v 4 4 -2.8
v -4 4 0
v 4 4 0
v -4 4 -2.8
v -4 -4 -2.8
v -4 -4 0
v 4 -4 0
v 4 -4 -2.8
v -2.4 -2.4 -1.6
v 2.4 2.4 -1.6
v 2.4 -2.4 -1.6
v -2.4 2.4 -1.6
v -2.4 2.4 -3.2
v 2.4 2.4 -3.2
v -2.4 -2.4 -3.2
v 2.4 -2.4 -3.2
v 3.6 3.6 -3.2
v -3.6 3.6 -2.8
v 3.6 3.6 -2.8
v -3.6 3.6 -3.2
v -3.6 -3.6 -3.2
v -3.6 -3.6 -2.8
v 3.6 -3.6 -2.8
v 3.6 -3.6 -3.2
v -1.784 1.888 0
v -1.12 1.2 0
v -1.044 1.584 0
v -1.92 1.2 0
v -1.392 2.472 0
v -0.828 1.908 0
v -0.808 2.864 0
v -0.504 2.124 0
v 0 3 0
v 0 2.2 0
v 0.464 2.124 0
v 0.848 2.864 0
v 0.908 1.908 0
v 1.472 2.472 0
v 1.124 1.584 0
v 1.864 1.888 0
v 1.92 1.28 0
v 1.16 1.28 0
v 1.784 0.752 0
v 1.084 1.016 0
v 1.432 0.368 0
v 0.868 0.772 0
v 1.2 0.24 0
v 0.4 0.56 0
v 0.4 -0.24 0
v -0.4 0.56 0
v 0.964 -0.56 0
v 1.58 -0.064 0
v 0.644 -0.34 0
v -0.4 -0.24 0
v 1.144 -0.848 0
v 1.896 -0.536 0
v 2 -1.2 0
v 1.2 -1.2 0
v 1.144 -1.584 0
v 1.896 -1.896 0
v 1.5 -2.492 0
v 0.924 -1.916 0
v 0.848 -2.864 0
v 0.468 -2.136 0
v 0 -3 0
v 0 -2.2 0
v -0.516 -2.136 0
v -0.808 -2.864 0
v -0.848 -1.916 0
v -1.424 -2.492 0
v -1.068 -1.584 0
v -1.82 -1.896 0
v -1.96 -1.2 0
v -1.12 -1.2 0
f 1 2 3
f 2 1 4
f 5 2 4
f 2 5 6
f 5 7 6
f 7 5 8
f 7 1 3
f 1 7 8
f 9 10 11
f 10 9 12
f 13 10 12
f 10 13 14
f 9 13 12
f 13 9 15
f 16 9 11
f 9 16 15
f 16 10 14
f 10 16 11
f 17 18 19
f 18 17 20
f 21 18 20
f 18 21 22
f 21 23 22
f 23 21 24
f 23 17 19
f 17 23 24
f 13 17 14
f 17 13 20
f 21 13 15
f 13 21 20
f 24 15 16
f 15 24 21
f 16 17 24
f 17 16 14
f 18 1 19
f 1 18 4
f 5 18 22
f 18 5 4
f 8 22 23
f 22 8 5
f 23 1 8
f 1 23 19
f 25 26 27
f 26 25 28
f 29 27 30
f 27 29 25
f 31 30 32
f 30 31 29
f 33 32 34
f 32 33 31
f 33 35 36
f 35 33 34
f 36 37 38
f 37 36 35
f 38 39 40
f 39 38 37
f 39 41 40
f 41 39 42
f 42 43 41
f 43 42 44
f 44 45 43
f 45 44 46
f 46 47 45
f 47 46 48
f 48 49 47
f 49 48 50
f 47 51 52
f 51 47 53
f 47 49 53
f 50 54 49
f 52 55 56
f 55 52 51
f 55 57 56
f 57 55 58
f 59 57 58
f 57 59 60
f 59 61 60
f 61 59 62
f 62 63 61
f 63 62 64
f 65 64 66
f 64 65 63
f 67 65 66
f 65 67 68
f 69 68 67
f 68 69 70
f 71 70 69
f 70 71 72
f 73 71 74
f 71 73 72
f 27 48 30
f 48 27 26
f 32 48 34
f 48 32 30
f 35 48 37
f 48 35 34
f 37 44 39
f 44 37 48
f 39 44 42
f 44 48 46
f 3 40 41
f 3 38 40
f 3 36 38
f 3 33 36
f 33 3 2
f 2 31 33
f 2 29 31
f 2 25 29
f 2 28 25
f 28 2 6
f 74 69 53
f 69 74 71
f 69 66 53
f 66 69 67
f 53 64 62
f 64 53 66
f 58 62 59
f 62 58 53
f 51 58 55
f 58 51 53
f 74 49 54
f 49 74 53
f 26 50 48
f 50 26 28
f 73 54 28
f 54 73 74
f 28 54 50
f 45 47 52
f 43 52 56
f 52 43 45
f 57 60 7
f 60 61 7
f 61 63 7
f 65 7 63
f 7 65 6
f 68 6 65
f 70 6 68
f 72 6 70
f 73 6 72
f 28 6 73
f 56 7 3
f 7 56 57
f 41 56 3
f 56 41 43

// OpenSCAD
// file: ../p/4-4edge.scad
use <../lib.scad>
$fa=1; $fs=0.2;
function ldraw_lib__4_4edge(realsolid=false) = [
// 0 Circle 1.0
// 0 Name: 4-4edge.dat
// 0 Author: James Jessiman
// 0 !LDRAW_ORG Primitive UPDATE 2017-01
// 0 !LICENSE Licensed under CC BY 2.0 and CC BY 4.0 : see CAreadme.txt
// 
// 0 BFC CERTIFY CCW
  [0,"BFC","CERTIFY"],
  [0,"BFC","CCW"],
// 
// 0 !HISTORY 1998-12-15 [PTadmin] Official Update 1998-10
// 0 !HISTORY 2005-12-28 [PTadmin] Official Update 2005-01
// 0 !HISTORY 2007-06-24 [PTadmin] Header formatted for Contributor Agreement
// 0 !HISTORY 2008-07-01 [PTadmin] Official Update 2008-01
// 0 !HISTORY 2017-01-15 [Steffen] BFCed
// 0 !HISTORY 2017-12-30 [PTadmin] Official Update 2017-01
// 
// 
// 2 24 1 0 0 0.9239 0 0.3827
  [2,24,1,0,0,0.9239,0,0.3827],
// 2 24 0.9239 0 0.3827 0.7071 0 0.7071
  [2,24,0.9239,0,0.3827,0.7071,0,0.7071],
// 2 24 0.7071 0 0.7071 0.3827 0 0.9239
  [2,24,0.7071,0,0.7071,0.3827,0,0.9239],
// 2 24 0.3827 0 0.9239 0 0 1
  [2,24,0.3827,0,0.9239,0,0,1],
// 2 24 0 0 1 -0.3827 0 0.9239
  [2,24,0,0,1,-0.3827,0,0.9239],
// 2 24 -0.3827 0 0.9239 -0.7071 0 0.7071
  [2,24,-0.3827,0,0.9239,-0.7071,0,0.7071],
// 2 24 -0.7071 0 0.7071 -0.9239 0 0.3827
  [2,24,-0.7071,0,0.7071,-0.9239,0,0.3827],
// 2 24 -0.9239 0 0.3827 -1 0 -0
  [2,24,-0.9239,0,0.3827,-1,0,-0],
// 2 24 -1 0 -0 -0.9239 0 -0.3827
  [2,24,-1,0,-0,-0.9239,0,-0.3827],
// 2 24 -0.9239 0 -0.3827 -0.7071 0 -0.7071
  [2,24,-0.9239,0,-0.3827,-0.7071,0,-0.7071],
// 2 24 -0.7071 0 -0.7071 -0.3827 0 -0.9239
  [2,24,-0.7071,0,-0.7071,-0.3827,0,-0.9239],
// 2 24 -0.3827 0 -0.9239 0 0 -1
  [2,24,-0.3827,0,-0.9239,0,0,-1],
// 2 24 0 0 -1 0.3827 0 -0.9239
  [2,24,0,0,-1,0.3827,0,-0.9239],
// 2 24 0.3827 0 -0.9239 0.7071 0 -0.7071
  [2,24,0.3827,0,-0.9239,0.7071,0,-0.7071],
// 2 24 0.7071 0 -0.7071 0.9239 0 -0.3827
  [2,24,0.7071,0,-0.7071,0.9239,0,-0.3827],
// 2 24 0.9239 0 -0.3827 1 0 0
  [2,24,0.9239,0,-0.3827,1,0,0],
];
module ldraw_lib__4_4edge(step=0, col=false, unit=2/5, alt=false, line=0.2, solid=!$preview)
    makepoly(ldraw_lib__4_4edge(solid), step=step, col=col, unit=unit, alt=alt, line=line, solid=solid);
ldraw_lib__4_4edge(line=0.2);
// file: ../p/4-4disc.scad
use <../lib.scad>
$fa=1; $fs=0.2;
function ldraw_lib__4_4disc(realsolid=false) = [
// 0 Disc 1.0
// 0 Name: 4-4disc.dat
// 0 Author: James Jessiman
// 0 !LDRAW_ORG Primitive UPDATE 2002-02
// 0 !LICENSE Licensed under CC BY 2.0 and CC BY 4.0 : see CAreadme.txt
// 
// 0 BFC CERTIFY CCW
  [0,"BFC","CERTIFY"],
  [0,"BFC","CCW"],
// 
// 0 !HISTORY 1998-12-15 [PTadmin] Official Update 1998-10
// 0 !HISTORY 2002-03-23 [sbliss] Added BFC statement
// 0 !HISTORY 2002-04-25 [PTadmin] Official Update 2002-02
// 0 !HISTORY 2007-06-24 [PTadmin] Header formatted for Contributor Agreement
// 0 !HISTORY 2008-07-01 [PTadmin] Official Update 2008-01
// 
// 
// 3 16 0 0 0 1 0 0 0.9239 0 0.3827
  [3,16,0,0,0,1,0,0,0.9239,0,0.3827],
// 3 16 0 0 0 0.9239 0 0.3827 0.7071 0 0.7071
  [3,16,0,0,0,0.9239,0,0.3827,0.7071,0,0.7071],
// 3 16 0 0 0 0.7071 0 0.7071 0.3827 0 0.9239
  [3,16,0,0,0,0.7071,0,0.7071,0.3827,0,0.9239],
// 3 16 0 0 0 0.3827 0 0.9239 0 0 1
  [3,16,0,0,0,0.3827,0,0.9239,0,0,1],
// 3 16 0 0 0 0 0 1 -0.3827 0 0.9239
  [3,16,0,0,0,0,0,1,-0.3827,0,0.9239],
// 3 16 0 0 0 -0.3827 0 0.9239 -0.7071 0 0.7071
  [3,16,0,0,0,-0.3827,0,0.9239,-0.7071,0,0.7071],
// 3 16 0 0 0 -0.7071 0 0.7071 -0.9239 0 0.3827
  [3,16,0,0,0,-0.7071,0,0.7071,-0.9239,0,0.3827],
// 3 16 0 0 0 -0.9239 0 0.3827 -1 0 -0
  [3,16,0,0,0,-0.9239,0,0.3827,-1,0,-0],
// 3 16 0 0 0 -1 0 -0 -0.9239 0 -0.3827
  [3,16,0,0,0,-1,0,-0,-0.9239,0,-0.3827],
// 3 16 0 0 0 -0.9239 0 -0.3827 -0.7071 0 -0.7071
  [3,16,0,0,0,-0.9239,0,-0.3827,-0.7071,0,-0.7071],
// 3 16 0 0 0 -0.7071 0 -0.7071 -0.3827 0 -0.9239
  [3,16,0,0,0,-0.7071,0,-0.7071,-0.3827,0,-0.9239],
// 3 16 0 0 0 -0.3827 0 -0.9239 0 0 -1
  [3,16,0,0,0,-0.3827,0,-0.9239,0,0,-1],
// 3 16 0 0 0 0 0 -1 0.3827 0 -0.9239
  [3,16,0,0,0,0,0,-1,0.3827,0,-0.9239],
// 3 16 0 0 0 0.3827 0 -0.9239 0.7071 0 -0.7071
  [3,16,0,0,0,0.3827,0,-0.9239,0.7071,0,-0.7071],
// 3 16 0 0 0 0.7071 0 -0.7071 0.9239 0 -0.3827
  [3,16,0,0,0,0.7071,0,-0.7071,0.9239,0,-0.3827],
// 3 16 0 0 0 0.9239 0 -0.3827 1 0 0
  [3,16,0,0,0,0.9239,0,-0.3827,1,0,0],
// 0
];
module ldraw_lib__4_4disc(step=0, col=false, unit=2/5, alt=false, line=0.2, solid=!$preview)
    makepoly(ldraw_lib__4_4disc(solid), step=step, col=col, unit=unit, alt=alt, line=line, solid=solid);
ldraw_lib__4_4disc(line=0.2);
// file: ../p/4-4cyli.scad
use <../lib.scad>
$fa=1; $fs=0.2;
function ldraw_lib__4_4cyli(realsolid=false) = [
// 0 Cylinder 1.0
// 0 Name: 4-4cyli.dat
// 0 Author: James Jessiman
// 0 !LDRAW_ORG Primitive UPDATE 2005-01
// 0 !LICENSE Licensed under CC BY 2.0 and CC BY 4.0 : see CAreadme.txt
// 
// 0 BFC CERTIFY CCW
  [0,"BFC","CERTIFY"],
  [0,"BFC","CCW"],
// 
// 0 !HISTORY 1998-12-15 [PTadmin] Official Update 1998-10
// 0 !HISTORY 2002-03-23 [sbliss] Added BFC statement; merged headers from files in distributions LDraw 0.27 and Complete.
// 0 !HISTORY 2002-04-25 [PTadmin] Official Update 2002-02
// 0 !HISTORY 2004-12-14 [guyvivan] BFC CCW
// 0 !HISTORY 2005-12-28 [PTadmin] Official Update 2005-01
// 0 !HISTORY 2007-06-24 [PTadmin] Header formatted for Contributor Agreement
// 0 !HISTORY 2008-07-01 [PTadmin] Official Update 2008-01
// 
// 
// 4 16 1 1 0 0.9239 1 0.3827 0.9239 0 0.3827 1 0 0
  [4,16,1,1,0,0.9239,1,0.3827,0.9239,0,0.3827,1,0,0],
// 5 24 1 0 0 1 1 0 0.9239 0 0.3827 0.9239 0 -0.3827
  [5,24,1,0,0,1,1,0,0.9239,0,0.3827,0.9239,0,-0.3827],
// 4 16 0.9239 1 0.3827 0.7071 1 0.7071 0.7071 0 0.7071 0.9239 0 0.3827
  [4,16,0.9239,1,0.3827,0.7071,1,0.7071,0.7071,0,0.7071,0.9239,0,0.3827],
// 5 24 0.9239 0 0.3827 0.9239 1 0.3827 0.7071 0 0.7071 1 0 0
  [5,24,0.9239,0,0.3827,0.9239,1,0.3827,0.7071,0,0.7071,1,0,0],
// 4 16 0.7071 1 0.7071 0.3827 1 0.9239 0.3827 0 0.9239 0.7071 0 0.7071
  [4,16,0.7071,1,0.7071,0.3827,1,0.9239,0.3827,0,0.9239,0.7071,0,0.7071],
// 5 24 0.7071 0 0.7071 0.7071 1 0.7071 0.3827 0 0.9239 0.9239 0 0.3827
  [5,24,0.7071,0,0.7071,0.7071,1,0.7071,0.3827,0,0.9239,0.9239,0,0.3827],
// 4 16 0.3827 1 0.9239 0 1 1 0 0 1 0.3827 0 0.9239
  [4,16,0.3827,1,0.9239,0,1,1,0,0,1,0.3827,0,0.9239],
// 5 24 0.3827 0 0.9239 0.3827 1 0.9239 0 0 1 0.7071 0 0.7071
  [5,24,0.3827,0,0.9239,0.3827,1,0.9239,0,0,1,0.7071,0,0.7071],
// 4 16 0 1 1 -0.3827 1 0.9239 -0.3827 0 0.9239 0 0 1
  [4,16,0,1,1,-0.3827,1,0.9239,-0.3827,0,0.9239,0,0,1],
// 5 24 0 0 1 0 1 1 -0.3827 0 0.9239 0.3827 0 0.9239
  [5,24,0,0,1,0,1,1,-0.3827,0,0.9239,0.3827,0,0.9239],
// 4 16 -0.3827 1 0.9239 -0.7071 1 0.7071 -0.7071 0 0.7071 -0.3827 0 0.9239
  [4,16,-0.3827,1,0.9239,-0.7071,1,0.7071,-0.7071,0,0.7071,-0.3827,0,0.9239],
// 5 24 -0.3827 0 0.9239 -0.3827 1 0.9239 -0.7071 0 0.7071 0 0 1
  [5,24,-0.3827,0,0.9239,-0.3827,1,0.9239,-0.7071,0,0.7071,0,0,1],
// 4 16 -0.7071 1 0.7071 -0.9239 1 0.3827 -0.9239 0 0.3827 -0.7071 0 0.7071
  [4,16,-0.7071,1,0.7071,-0.9239,1,0.3827,-0.9239,0,0.3827,-0.7071,0,0.7071],
// 5 24 -0.7071 0 0.7071 -0.7071 1 0.7071 -0.9239 0 0.3827 -0.3827 0 0.9239
  [5,24,-0.7071,0,0.7071,-0.7071,1,0.7071,-0.9239,0,0.3827,-0.3827,0,0.9239],
// 4 16 -0.9239 1 0.3827 -1 1 0 -1 0 0 -0.9239 0 0.3827
  [4,16,-0.9239,1,0.3827,-1,1,0,-1,0,0,-0.9239,0,0.3827],
// 5 24 -0.9239 0 0.3827 -0.9239 1 0.3827 -1 0 0 -0.7071 0 0.7071
  [5,24,-0.9239,0,0.3827,-0.9239,1,0.3827,-1,0,0,-0.7071,0,0.7071],
// 4 16 -1 1 0 -0.9239 1 -0.3827 -0.9239 0 -0.3827 -1 0 0
  [4,16,-1,1,0,-0.9239,1,-0.3827,-0.9239,0,-0.3827,-1,0,0],
// 5 24 -1 0 0 -1 1 0 -0.9239 0 -0.3827 -0.9239 0 0.3827
  [5,24,-1,0,0,-1,1,0,-0.9239,0,-0.3827,-0.9239,0,0.3827],
// 4 16 -0.9239 1 -0.3827 -0.7071 1 -0.7071 -0.7071 0 -0.7071 -0.9239 0 -0.3827
  [4,16,-0.9239,1,-0.3827,-0.7071,1,-0.7071,-0.7071,0,-0.7071,-0.9239,0,-0.3827],
// 5 24 -0.9239 0 -0.3827 -0.9239 1 -0.3827 -0.7071 0 -0.7071 -1 0 0
  [5,24,-0.9239,0,-0.3827,-0.9239,1,-0.3827,-0.7071,0,-0.7071,-1,0,0],
// 4 16 -0.7071 1 -0.7071 -0.3827 1 -0.9239 -0.3827 0 -0.9239 -0.7071 0 -0.7071
  [4,16,-0.7071,1,-0.7071,-0.3827,1,-0.9239,-0.3827,0,-0.9239,-0.7071,0,-0.7071],
// 5 24 -0.7071 0 -0.7071 -0.7071 1 -0.7071 -0.3827 0 -0.9239 -0.9239 0 -0.3827
  [5,24,-0.7071,0,-0.7071,-0.7071,1,-0.7071,-0.3827,0,-0.9239,-0.9239,0,-0.3827],
// 4 16 -0.3827 1 -0.9239 0 1 -1 0 0 -1 -0.3827 0 -0.9239
  [4,16,-0.3827,1,-0.9239,0,1,-1,0,0,-1,-0.3827,0,-0.9239],
// 5 24 -0.3827 0 -0.9239 -0.3827 1 -0.9239 0 0 -1 -0.7071 0 -0.7071
  [5,24,-0.3827,0,-0.9239,-0.3827,1,-0.9239,0,0,-1,-0.7071,0,-0.7071],
// 4 16 0 1 -1 0.3827 1 -0.9239 0.3827 0 -0.9239 0 0 -1
  [4,16,0,1,-1,0.3827,1,-0.9239,0.3827,0,-0.9239,0,0,-1],
// 5 24 0 0 -1 0 1 -1 0.3827 0 -0.9239 -0.3827 0 -0.9239
  [5,24,0,0,-1,0,1,-1,0.3827,0,-0.9239,-0.3827,0,-0.9239],
// 4 16 0.3827 1 -0.9239 0.7071 1 -0.7071 0.7071 0 -0.7071 0.3827 0 -0.9239
  [4,16,0.3827,1,-0.9239,0.7071,1,-0.7071,0.7071,0,-0.7071,0.3827,0,-0.9239],
// 5 24 0.3827 0 -0.9239 0.3827 1 -0.9239 0.7071 0 -0.7071 0 0 -1
  [5,24,0.3827,0,-0.9239,0.3827,1,-0.9239,0.7071,0,-0.7071,0,0,-1],
// 4 16 0.7071 1 -0.7071 0.9239 1 -0.3827 0.9239 0 -0.3827 0.7071 0 -0.7071
  [4,16,0.7071,1,-0.7071,0.9239,1,-0.3827,0.9239,0,-0.3827,0.7071,0,-0.7071],
// 5 24 0.7071 0 -0.7071 0.7071 1 -0.7071 0.9239 0 -0.3827 0.3827 0 -0.9239
  [5,24,0.7071,0,-0.7071,0.7071,1,-0.7071,0.9239,0,-0.3827,0.3827,0,-0.9239],
// 4 16 0.9239 1 -0.3827 1 1 0 1 0 0 0.9239 0 -0.3827
  [4,16,0.9239,1,-0.3827,1,1,0,1,0,0,0.9239,0,-0.3827],
// 5 24 0.9239 0 -0.3827 0.9239 1 -0.3827 1 0 0 0.7071 0 -0.7071
  [5,24,0.9239,0,-0.3827,0.9239,1,-0.3827,1,0,0,0.7071,0,-0.7071],
// 0
];
module ldraw_lib__4_4cyli(step=0, col=false, unit=2/5, alt=false, line=0.2, solid=!$preview)
    makepoly(ldraw_lib__4_4cyli(solid), step=step, col=col, unit=unit, alt=alt, line=line, solid=solid);
ldraw_lib__4_4cyli(line=0.2);
// file: ../p/stud3.scad
use <../lib.scad>
use <4-4cyli.scad>
use <4-4disc.scad>
use <4-4edge.scad>
$fa=1; $fs=0.2;
function ldraw_lib__stud3(realsolid=false) = realsolid ? 
    [openscad(translate([0,0,-eps()], o=cylinder(4+eps(), r=4)),2)] : [
// 0 Stud Tube Solid
// 0 Name: stud3.dat
// 0 Author: James Jessiman
// 0 !LDRAW_ORG Primitive UPDATE 2012-01
// 0 !LICENSE Licensed under CC BY 2.0 and CC BY 4.0 : see CAreadme.txt
// 
// 0 BFC CERTIFY CCW
  [0,"BFC","CERTIFY"],
  [0,"BFC","CCW"],
// 
// 0 !HISTORY 2002-04-04 [sbliss] Modified for BFC compliance
// 0 !HISTORY 2002-04-25 [PTadmin] Official Update 2002-02
// 0 !HISTORY 2007-06-24 [PTadmin] Header formatted for Contributor Agreement
// 0 !HISTORY 2008-07-01 [PTadmin] Official Update 2008-01
// 0 !HISTORY 2012-02-16 [Philo] Changed to CCW
// 0 !HISTORY 2012-03-30 [PTadmin] Official Update 2012-01
// 
// 
// 1 16 0 -4 0 4 0 0 0 1 0 0 0 4 4-4edge.dat
  [1,16,0,-4,0,4,0,0,0,1,0,0,0,4, ldraw_lib__4_4edge(realsolid)],
// 1 16 0 0 0 4 0 0 0 1 0 0 0 4 4-4edge.dat
  [1,16,0,0,0,4,0,0,0,1,0,0,0,4, ldraw_lib__4_4edge(realsolid)],
// 1 16 0 -4 0 4 0 0 0 1 0 0 0 4 4-4disc.dat
  [1,16,0,-4,0,4,0,0,0,1,0,0,0,4, ldraw_lib__4_4disc(realsolid)],
// 1 16 0 -4 0 4 0 0 0 4 0 0 0 4 4-4cyli.dat
  [1,16,0,-4,0,4,0,0,0,4,0,0,0,4, ldraw_lib__4_4cyli(realsolid)],
];
module ldraw_lib__stud3(step=0, col=false, unit=2/5, alt=false, line=0.2, solid=!$preview)
    makepoly(ldraw_lib__stud3(solid), step=step, col=col, unit=unit, alt=alt, line=line, solid=solid);
ldraw_lib__stud3(line=0.2);
// file: ../p/stud.scad
use <../lib.scad>
use <4-4cyli.scad>
use <4-4disc.scad>
use <4-4edge.scad>
$fa=1; $fs=0.2;
function ldraw_lib__stud(realsolid=false) = realsolid ? 
    [openscad(translate([0,0,-eps()], o=cylinder(4+eps(), r=6)),2)] : [
// 0 Stud
// 0 Name: stud.dat
// 0 Author: James Jessiman
// 0 !LDRAW_ORG Primitive UPDATE 2012-01
// 0 !LICENSE Licensed under CC BY 2.0 and CC BY 4.0 : see CAreadme.txt
// 
// 0 BFC CERTIFY CCW
  [0,"BFC","CERTIFY"],
  [0,"BFC","CCW"],
// 
// 0 !HISTORY 2002-04-04 [sbliss] Modified for BFC compliance
// 0 !HISTORY 2002-04-25 [PTadmin] Official Update 2002-02
// 0 !HISTORY 2007-06-24 [PTadmin] Header formatted for Contributor Agreement
// 0 !HISTORY 2008-07-01 [PTadmin] Official Update 2008-01
// 0 !HISTORY 2012-02-16 [Philo] Changed to CCW
// 0 !HISTORY 2012-03-30 [PTadmin] Official Update 2012-01
// 
// 
// 1 16 0 0 0 6 0 0 0 1 0 0 0 6 4-4edge.dat
  [1,16,0,0,0,6,0,0,0,1,0,0,0,6, ldraw_lib__4_4edge(realsolid)],
// 1 16 0 -4 0 6 0 0 0 1 0 0 0 6 4-4edge.dat
  [1,16,0,-4,0,6,0,0,0,1,0,0,0,6, ldraw_lib__4_4edge(realsolid)],
// 1 16 0 0 0 6 0 0 0 -4 0 0 0 6 4-4cyli.dat
  [1,16,0,0,0,6,0,0,0,-4,0,0,0,6, ldraw_lib__4_4cyli(realsolid)],
// 1 16 0 -4 0 6 0 0 0 1 0 0 0 6 4-4disc.dat
  [1,16,0,-4,0,6,0,0,0,1,0,0,0,6, ldraw_lib__4_4disc(realsolid)],
];
module ldraw_lib__stud(step=0, col=false, unit=2/5, alt=false, line=0.2, solid=!$preview)
    makepoly(ldraw_lib__stud(solid), step=step, col=col, unit=unit, alt=alt, line=line, solid=solid);
ldraw_lib__stud(line=0.2);
// file: ../p/box4t.scad
use <../lib.scad>
$fa=1; $fs=0.2;
function ldraw_lib__box4t(realsolid=false) = [
// 0 Box with 4 Adjacent Faces and All Edges
// 0 Name: box4t.dat
// 0 Author: Tore Eriksson [Tore_Eriksson]
// 0 !LDRAW_ORG Primitive UPDATE 2003-02
// 0 !LICENSE Licensed under CC BY 2.0 and CC BY 4.0 : see CAreadme.txt
// 
// 0 BFC CERTIFY CCW
  [0,"BFC","CERTIFY"],
  [0,"BFC","CCW"],
// 
// 0 !HISTORY 1997-09-29 [PTadmin] Official Update 1997-15
// 0 !HISTORY 2002-08-31 [izanette] Modified with WINDZ for BFC compliance
// 0 !HISTORY 2003-08-01 [PTadmin] Official Update 2003-02
// 0 !HISTORY 2007-06-24 [PTadmin] Header formatted for Contributor Agreement
// 0 !HISTORY 2008-07-01 [PTadmin] Official Update 2008-01
// 
// 
// 2 24 1 1 1 -1 1 1
  [2,24,1,1,1,-1,1,1],
// 2 24 -1 1 1 -1 1 -1
  [2,24,-1,1,1,-1,1,-1],
// 2 24 -1 1 -1 1 1 -1
  [2,24,-1,1,-1,1,1,-1],
// 2 24 1 1 -1 1 1 1
  [2,24,1,1,-1,1,1,1],
// 2 24 1 0 1 -1 0 1
  [2,24,1,0,1,-1,0,1],
// 2 24 -1 0 1 -1 0 -1
  [2,24,-1,0,1,-1,0,-1],
// 2 24 -1 0 -1 1 0 -1
  [2,24,-1,0,-1,1,0,-1],
// 2 24 1 0 -1 1 0 1
  [2,24,1,0,-1,1,0,1],
// 2 24 1 0 1 1 1 1
  [2,24,1,0,1,1,1,1],
// 2 24 -1 0 1 -1 1 1
  [2,24,-1,0,1,-1,1,1],
// 2 24 1 0 -1 1 1 -1
  [2,24,1,0,-1,1,1,-1],
// 2 24 -1 0 -1 -1 1 -1
  [2,24,-1,0,-1,-1,1,-1],
// 4 16 1 1 1 1 1 -1 -1 1 -1 -1 1 1
  [4,16,1,1,1,1,1,-1,-1,1,-1,-1,1,1],
// 4 16 1 1 1 -1 1 1 -1 0 1 1 0 1
  [4,16,1,1,1,-1,1,1,-1,0,1,1,0,1],
// 4 16 -1 1 1 -1 1 -1 -1 0 -1 -1 0 1
  [4,16,-1,1,1,-1,1,-1,-1,0,-1,-1,0,1],
// 0 4 16 -1 1 -1 -1 0 -1 1 0 -1 1 1 -1
// 4 16 1 1 -1 1 1 1 1 0 1 1 0 -1
  [4,16,1,1,-1,1,1,1,1,0,1,1,0,-1],
// 0
];
module ldraw_lib__box4t(step=0, col=false, unit=2/5, alt=false, line=0.2, solid=!$preview)
    makepoly(ldraw_lib__box4t(solid), step=step, col=col, unit=unit, alt=alt, line=line, solid=solid);
ldraw_lib__box4t(line=0.2);
// file: s/3004s01.scad
use <../../lib.scad>
use <../../p/box4t.scad>
use <../../p/box5.scad>
use <../../p/stud.scad>
use <../../p/stud3.scad>
$fa=1; $fs=0.2;
function ldraw_lib__s__3004s01(realsolid=false) = [
// 0 ~Brick  1 x  2 without Front Face
// 0 Name: s\3004s01.dat
// 0 Author: James Jessiman
// 0 !LDRAW_ORG Subpart UPDATE 2003-03
// 0 !LICENSE Licensed under CC BY 2.0 and CC BY 4.0 : see CAreadme.txt
// 
// 0 BFC CERTIFY CCW
  [0,"BFC","CERTIFY"],
  [0,"BFC","CCW"],
// 
// 0 !HISTORY 2003-09-07 [jriley] Subfiling, BFC
// 0 !HISTORY 2003-12-19 [PTadmin] Official Update 2003-03
// 0 !HISTORY 2007-08-29 [PTadmin] Header formatted for Contributor Agreement
// 0 !HISTORY 2008-07-01 [PTadmin] Official Update 2008-01
// 
// 
// 1 16 0 4 0 1 0 0 0 -5 0 0 0 1 stud3.dat
  [1,16,0,4,0,1,0,0,0,-5,0,0,0,1, ldraw_lib__stud3(realsolid)],
// 0 BFC INVERTNEXT
  [0,"BFC","INVERTNEXT"],
// 1 16 0 24 0 16 0 0 0 -20 0 0 0 6 box5.dat
  [1,16,0,24,0,16,0,0,0,-20,0,0,0,6, ldraw_lib__box5(realsolid)],
// 4 16 20 24 10 16 24 6 -16 24 6 -20 24 10
  [4,16,20,24,10,16,24,6,-16,24,6,-20,24,10],
// 4 16 -20 24 10 -16 24 6 -16 24 -6 -20 24 -10
  [4,16,-20,24,10,-16,24,6,-16,24,-6,-20,24,-10],
// 4 16 -20 24 -10 -16 24 -6 16 24 -6 20 24 -10
  [4,16,-20,24,-10,-16,24,-6,16,24,-6,20,24,-10],
// 4 16 20 24 -10 16 24 -6 16 24 6 20 24 10
  [4,16,20,24,-10,16,24,-6,16,24,6,20,24,10],
// 1 16 0 24 0 20 0 0 0 -24 0 0 0 10 box4t.dat
  [1,16,0,24,0,20,0,0,0,-24,0,0,0,10, ldraw_lib__box4t(realsolid)],
// 1 16 10 0 0 1 0 0 0 1 0 0 0 1 stud.dat
  [1,16,10,0,0,1,0,0,0,1,0,0,0,1, ldraw_lib__stud(realsolid)],
// 1 16 -10 0 0 1 0 0 0 1 0 0 0 1 stud.dat
  [1,16,-10,0,0,1,0,0,0,1,0,0,0,1, ldraw_lib__stud(realsolid)],
// 0
];
module ldraw_lib__s__3004s01(step=0, col=false, unit=2/5, alt=false, line=0.2, solid=!$preview)
    makepoly(ldraw_lib__s__3004s01(solid), step=step, col=col, unit=unit, alt=alt, line=line, solid=solid);
ldraw_lib__s__3004s01(line=0.2);
// file: ../p/box5.scad
use <../lib.scad>
$fa=1; $fs=0.2;
function ldraw_lib__box5(realsolid=false) = [
// 0 Box with 5 Faces and All Edges
// 0 Name: box5.dat
// 0 Author: James Jessiman
// 0 !LDRAW_ORG Primitive UPDATE 2012-01
// 0 !LICENSE Licensed under CC BY 2.0 and CC BY 4.0 : see CAreadme.txt
// 
// 0 BFC CERTIFY CCW
  [0,"BFC","CERTIFY"],
  [0,"BFC","CCW"],
// 
// 0 !HISTORY 2002-04-03 [sbliss] Modified for BFC compliance
// 0 !HISTORY 2002-04-25 [PTadmin] Official Update 2002-02
// 0 !HISTORY 2007-06-24 [PTadmin] Header formatted for Contributor Agreement
// 0 !HISTORY 2008-07-01 [PTadmin] Official Update 2008-01
// 0 !HISTORY 2012-02-16 [Philo] Changed to CCW
// 0 !HISTORY 2012-03-30 [PTadmin] Official Update 2012-01
// 
// 
// 2 24 1 1 1 -1 1 1
  [2,24,1,1,1,-1,1,1],
// 2 24 -1 1 1 -1 1 -1
  [2,24,-1,1,1,-1,1,-1],
// 2 24 -1 1 -1 1 1 -1
  [2,24,-1,1,-1,1,1,-1],
// 2 24 1 1 -1 1 1 1
  [2,24,1,1,-1,1,1,1],
// 2 24 1 0 1 -1 0 1
  [2,24,1,0,1,-1,0,1],
// 2 24 -1 0 1 -1 0 -1
  [2,24,-1,0,1,-1,0,-1],
// 2 24 -1 0 -1 1 0 -1
  [2,24,-1,0,-1,1,0,-1],
// 2 24 1 0 -1 1 0 1
  [2,24,1,0,-1,1,0,1],
// 2 24 1 0 1 1 1 1
  [2,24,1,0,1,1,1,1],
// 2 24 -1 0 1 -1 1 1
  [2,24,-1,0,1,-1,1,1],
// 2 24 1 0 -1 1 1 -1
  [2,24,1,0,-1,1,1,-1],
// 2 24 -1 0 -1 -1 1 -1
  [2,24,-1,0,-1,-1,1,-1],
// 4 16 -1 1 1 1 1 1 1 1 -1 -1 1 -1
  [4,16,-1,1,1,1,1,1,1,1,-1,-1,1,-1],
// 4 16 -1 1 1 -1 0 1 1 0 1 1 1 1
  [4,16,-1,1,1,-1,0,1,1,0,1,1,1,1],
// 4 16 -1 1 -1 -1 0 -1 -1 0 1 -1 1 1
  [4,16,-1,1,-1,-1,0,-1,-1,0,1,-1,1,1],
// 4 16 1 1 -1 1 0 -1 -1 0 -1 -1 1 -1
  [4,16,1,1,-1,1,0,-1,-1,0,-1,-1,1,-1],
// 4 16 1 1 1 1 0 1 1 0 -1 1 1 -1
  [4,16,1,1,1,1,0,1,1,0,-1,1,1,-1],
];
module ldraw_lib__box5(step=0, col=false, unit=2/5, alt=false, line=0.2, solid=!$preview)
    makepoly(ldraw_lib__box5(solid), step=step, col=col, unit=unit, alt=alt, line=line, solid=solid);
ldraw_lib__box5(line=0.2);
// file: ../p/box4.scad
use <../lib.scad>
$fa=1; $fs=0.2;
function ldraw_lib__box4(realsolid=false) = [
// 0 Box with 4 Faces (2 Parallel Pairs) and All Edges
// 0 Name: box4.dat
// 0 Author: James Jessiman
// 0 !LDRAW_ORG Primitive UPDATE 2012-01
// 0 !LICENSE Licensed under CC BY 2.0 and CC BY 4.0 : see CAreadme.txt
// 
// 0 BFC CERTIFY CCW
  [0,"BFC","CERTIFY"],
  [0,"BFC","CCW"],
// 
// 0 !HISTORY 2002-04-03 [sbliss] Modified for BFC compliance
// 0 !HISTORY 2002-04-25 [PTadmin] Official Update 2002-02
// 0 !HISTORY 2007-06-24 [PTadmin] Header formatted for Contributor Agreement
// 0 !HISTORY 2008-07-01 [PTadmin] Official Update 2008-01
// 0 !HISTORY 2012-02-16 [Philo] Changed to CCW
// 0 !HISTORY 2012-03-30 [PTadmin] Official Update 2012-01
// 
// 
// 2 24 1 1 1 -1 1 1
  [2,24,1,1,1,-1,1,1],
// 2 24 -1 1 1 -1 1 -1
  [2,24,-1,1,1,-1,1,-1],
// 2 24 -1 1 -1 1 1 -1
  [2,24,-1,1,-1,1,1,-1],
// 2 24 1 1 -1 1 1 1
  [2,24,1,1,-1,1,1,1],
// 2 24 1 0 1 -1 0 1
  [2,24,1,0,1,-1,0,1],
// 2 24 -1 0 1 -1 0 -1
  [2,24,-1,0,1,-1,0,-1],
// 2 24 -1 0 -1 1 0 -1
  [2,24,-1,0,-1,1,0,-1],
// 2 24 1 0 -1 1 0 1
  [2,24,1,0,-1,1,0,1],
// 2 24 1 0 1 1 1 1
  [2,24,1,0,1,1,1,1],
// 2 24 -1 0 1 -1 1 1
  [2,24,-1,0,1,-1,1,1],
// 2 24 1 0 -1 1 1 -1
  [2,24,1,0,-1,1,1,-1],
// 2 24 -1 0 -1 -1 1 -1
  [2,24,-1,0,-1,-1,1,-1],
// 4 16 -1 1 1 -1 0 1 1 0 1 1 1 1
  [4,16,-1,1,1,-1,0,1,1,0,1,1,1,1],
// 4 16 -1 1 -1 -1 0 -1 -1 0 1 -1 1 1
  [4,16,-1,1,-1,-1,0,-1,-1,0,1,-1,1,1],
// 4 16 1 1 -1 1 0 -1 -1 0 -1 -1 1 -1
  [4,16,1,1,-1,1,0,-1,-1,0,-1,-1,1,-1],
// 4 16 1 1 1 1 0 1 1 0 -1 1 1 -1
  [4,16,1,1,1,1,0,1,1,0,-1,1,1,-1],
];
module ldraw_lib__box4(step=0, col=false, unit=2/5, alt=false, line=0.2, solid=!$preview)
    makepoly(ldraw_lib__box4(solid), step=step, col=col, unit=unit, alt=alt, line=line, solid=solid);
ldraw_lib__box4(line=0.2);
// file: 3004.scad
use <../lib.scad>
use <s/3004s01.scad>
$fa=1; $fs=0.2;
function ldraw_lib__3004(realsolid=false) = [
// 0 Brick  1 x  2
// 0 Name: 3004.dat
// 0 Author: James Jessiman
// 0 !LDRAW_ORG Part UPDATE 2022-05
// 0 !LICENSE Licensed under CC BY 2.0 and CC BY 4.0 : see CAreadme.txt
// 
// 0 BFC CERTIFY CCW
  [0,"BFC","CERTIFY"],
  [0,"BFC","CCW"],
// 
// 0 !HISTORY 2001-10-26 [PTadmin] Official Update 2001-01
// 0 !HISTORY 2002-05-07 {unknown} BFC Certification
// 0 !HISTORY 2002-06-11 [PTadmin] Official Update 2002-03
// 0 !HISTORY 2007-05-07 [PTadmin] Header formatted for Contributor Agreement
// 0 !HISTORY 2008-07-01 [PTadmin] Official Update 2008-01
// 0 !HISTORY 2022-08-04 [MagFors] Using subfile
// 0 !HISTORY 2022-09-15 [PTadmin] Official Update 2022-05
// 
// 
// 1 16 0 0 0 1 0 0 0 1 0 0 0 1 s\3004s01.dat
  [1,16,0,0,0,1,0,0,0,1,0,0,0,1, ldraw_lib__s__3004s01(realsolid)],
// 4 16 -20 24 -10 20 24 -10 20 0 -10 -20 0 -10
  [4,16,-20,24,-10,20,24,-10,20,0,-10,-20,0,-10],
];
module ldraw_lib__3004(step=0, col=false, unit=2/5, alt=false, line=0.2, solid=!$preview)
    makepoly(ldraw_lib__3004(solid), step=step, col=col, unit=unit, alt=alt, line=line, solid=solid);
ldraw_lib__3004(line=0.2);
// file: s/3070bs01.scad
use <../../lib.scad>
use <../../p/box4.scad>
use <../../p/box5.scad>
$fa=1; $fs=0.2;
function ldraw_lib__s__3070bs01(realsolid=false) = [
// 0 ~Tile  1 x  1 with Groove without Top Face
// 0 Name: s\3070bs01.dat
// 0 Author: Chris Dee [cwdee]
// 0 !LDRAW_ORG Subpart UPDATE 2009-02
// 0 !LICENSE Licensed under CC BY 2.0 and CC BY 4.0 : see CAreadme.txt
// 
// 0 BFC CERTIFY CCW
  [0,"BFC","CERTIFY"],
  [0,"BFC","CCW"],
// 
// 0 !HISTORY 2009-09-03 [PTadmin] Official Update 2009-02
// 
// 
// 1 16 0 0 0 10 0 0 0 7 0 0 0 10 box4.dat
  [1,16,0,0,0,10,0,0,0,7,0,0,0,10, ldraw_lib__box4(realsolid)],
// 0 BFC INVERTNEXT
  [0,"BFC","INVERTNEXT"],
// 1 16 0 8 0 6 0 0 0 -4 0 0 0 6 box5.dat
  [1,16,0,8,0,6,0,0,0,-4,0,0,0,6, ldraw_lib__box5(realsolid)],
// 1 16 0 7 0 9 0 0 0 1 0 0 0 9 box4.dat
  [1,16,0,7,0,9,0,0,0,1,0,0,0,9, ldraw_lib__box4(realsolid)],
// 
// 4 16 9 8 9 6 8 6 -6 8 6 -9 8 9
  [4,16,9,8,9,6,8,6,-6,8,6,-9,8,9],
// 4 16 -9 8 9 -6 8 6 -6 8 -6 -9 8 -9
  [4,16,-9,8,9,-6,8,6,-6,8,-6,-9,8,-9],
// 4 16 -9 8 -9 -6 8 -6 6 8 -6 9 8 -9
  [4,16,-9,8,-9,-6,8,-6,6,8,-6,9,8,-9],
// 4 16 9 8 -9 6 8 -6 6 8 6 9 8 9
  [4,16,9,8,-9,6,8,-6,6,8,6,9,8,9],
// 
// 4 16 10 7 10 9 7 9 -9 7 9 -10 7 10
  [4,16,10,7,10,9,7,9,-9,7,9,-10,7,10],
// 4 16 -10 7 10 -9 7 9 -9 7 -9 -10 7 -10
  [4,16,-10,7,10,-9,7,9,-9,7,-9,-10,7,-10],
// 4 16 -10 7 -10 -9 7 -9 9 7 -9 10 7 -10
  [4,16,-10,7,-10,-9,7,-9,9,7,-9,10,7,-10],
// 4 16 10 7 -10 9 7 -9 9 7 9 10 7 10
  [4,16,10,7,-10,9,7,-9,9,7,9,10,7,10],
// 0
];
module ldraw_lib__s__3070bs01(step=0, col=false, unit=2/5, alt=false, line=0.2, solid=!$preview)
    makepoly(ldraw_lib__s__3070bs01(solid), step=step, col=col, unit=unit, alt=alt, line=line, solid=solid);
ldraw_lib__s__3070bs01(line=0.2);
// main file
use <../lib.scad>
use <s/3070bs01.scad>
$fa=1; $fs=0.2;
function ldraw_lib__3070bpv3(realsolid=false) = [
// 0 Tile  1 x  1 with Silver "3" Pattern
// 0 Name: 3070bpv3.dat
// 0 Author: Magnus Forsberg [MagFors]
// 0 !LDRAW_ORG Part UPDATE 2015-02
// 0 !LICENSE Licensed under CC BY 2.0 and CC BY 4.0 : see CAreadme.txt
// 
// 0 BFC CERTIFY CCW
  [0,"BFC","CERTIFY"],
  [0,"BFC","CCW"],
// 
// 0 !HISTORY 2015-12-30 [PTadmin] Official Update 2015-02
// 
// 
// 1 16 0 0 0 1 0 0 0 1 0 0 0 1 s\3070bs01.dat
  [1,16,0,0,0,1,0,0,0,1,0,0,0,1, ldraw_lib__s__3070bs01(realsolid)],
// 
// 4 80 -2.8 0 3 -2.61 0 3.96 -4.46 0 4.72 -4.8 0 3
  [4,80,-2.8,0,3,-2.61,0,3.96,-4.46,0,4.72,-4.8,0,3],
// 4 80 -3.48 0 6.18 -4.46 0 4.72 -2.61 0 3.96 -2.07 0 4.77
  [4,80,-3.48,0,6.18,-4.46,0,4.72,-2.61,0,3.96,-2.07,0,4.77],
// 4 80 -2.02 0 7.16 -3.48 0 6.18 -2.07 0 4.77 -1.26 0 5.31
  [4,80,-2.02,0,7.16,-3.48,0,6.18,-2.07,0,4.77,-1.26,0,5.31],
// 4 80 0 0 7.5 -2.02 0 7.16 -1.26 0 5.31 0 0 5.5
  [4,80,0,0,7.5,-2.02,0,7.16,-1.26,0,5.31,0,0,5.5],
// 4 80 2.12 0 7.16 0 0 7.5 0 0 5.5 1.16 0 5.31
  [4,80,2.12,0,7.16,0,0,7.5,0,0,5.5,1.16,0,5.31],
// 4 80 3.68 0 6.18 2.12 0 7.16 1.16 0 5.31 2.27 0 4.77
  [4,80,3.68,0,6.18,2.12,0,7.16,1.16,0,5.31,2.27,0,4.77],
// 4 80 4.66 0 4.72 3.68 0 6.18 2.27 0 4.77 2.81 0 3.96
  [4,80,4.66,0,4.72,3.68,0,6.18,2.27,0,4.77,2.81,0,3.96],
// 4 80 4.8 0 3.2 4.66 0 4.72 2.81 0 3.96 2.9 0 3.2
  [4,80,4.8,0,3.2,4.66,0,4.72,2.81,0,3.96,2.9,0,3.2],
// 4 80 4.46 0 1.88 4.8 0 3.2 2.9 0 3.2 2.71 0 2.54
  [4,80,4.46,0,1.88,4.8,0,3.2,2.9,0,3.2,2.71,0,2.54],
// 4 80 3.58 0 0.92 4.46 0 1.88 2.71 0 2.54 2.17 0 1.93
  [4,80,3.58,0,0.92,4.46,0,1.88,2.71,0,2.54,2.17,0,1.93],
// 4 80 3 0 0.6 3.58 0 0.92 2.17 0 1.93 1 0 1.4
  [4,80,3,0,0.6,3.58,0,0.92,2.17,0,1.93,1,0,1.4],
// 4 80 3 0 0.6 1 0 1.4 -1 0 1.4 1 0 -0.6
  [4,80,3,0,0.6,1,0,1.4,-1,0,1.4,1,0,-0.6],
// 4 80 3 0 0.6 1.61 0 -0.85 2.41 0 -1.4 3.95 0 -0.16
  [4,80,3,0,0.6,1.61,0,-0.85,2.41,0,-1.4,3.95,0,-0.16],
// 3 80 3 0 0.6 1 0 -0.6 1.61 0 -0.85
  [3,80,3,0,0.6,1,0,-0.6,1.61,0,-0.85],
// 3 80 -1 0 1.4 -1 0 -0.6 1 0 -0.6
  [3,80,-1,0,1.4,-1,0,-0.6,1,0,-0.6],
// 4 80 3.95 0 -0.16 2.41 0 -1.4 2.86 0 -2.12 4.74 0 -1.34
  [4,80,3.95,0,-0.16,2.41,0,-1.4,2.86,0,-2.12,4.74,0,-1.34],
// 4 80 4.74 0 -1.34 2.86 0 -2.12 3 0 -3 5 0 -3
  [4,80,4.74,0,-1.34,2.86,0,-2.12,3,0,-3,5,0,-3],
// 4 80 5 0 -3 3 0 -3 2.86 0 -3.96 4.74 0 -4.74
  [4,80,5,0,-3,3,0,-3,2.86,0,-3.96,4.74,0,-4.74],
// 4 80 4.74 0 -4.74 2.86 0 -3.96 2.31 0 -4.79 3.75 0 -6.23
  [4,80,4.74,0,-4.74,2.86,0,-3.96,2.31,0,-4.79,3.75,0,-6.23],
// 4 80 3.75 0 -6.23 2.31 0 -4.79 1.17 0 -5.34 2.12 0 -7.16
  [4,80,3.75,0,-6.23,2.31,0,-4.79,1.17,0,-5.34,2.12,0,-7.16],
// 4 80 2.12 0 -7.16 1.17 0 -5.34 0 0 -5.5 0 0 -7.5
  [4,80,2.12,0,-7.16,1.17,0,-5.34,0,0,-5.5,0,0,-7.5],
// 4 80 0 0 -7.5 0 0 -5.5 -1.29 0 -5.34 -2.02 0 -7.16
  [4,80,0,0,-7.5,0,0,-5.5,-1.29,0,-5.34,-2.02,0,-7.16],
// 4 80 -2.02 0 -7.16 -1.29 0 -5.34 -2.12 0 -4.79 -3.56 0 -6.23
  [4,80,-2.02,0,-7.16,-1.29,0,-5.34,-2.12,0,-4.79,-3.56,0,-6.23],
// 4 80 -3.56 0 -6.23 -2.12 0 -4.79 -2.67 0 -3.96 -4.55 0 -4.74
  [4,80,-3.56,0,-6.23,-2.12,0,-4.79,-2.67,0,-3.96,-4.55,0,-4.74],
// 4 80 -4.55 0 -4.74 -2.67 0 -3.96 -2.8 0 -3 -4.9 0 -3
  [4,80,-4.55,0,-4.74,-2.67,0,-3.96,-2.8,0,-3,-4.9,0,-3],
// 
// 4 16 -2.61 0 3.96 -2.8 0 3 1 0 1.4 -2.07 0 4.77
  [4,16,-2.61,0,3.96,-2.8,0,3,1,0,1.4,-2.07,0,4.77],
// 4 16 -1.26 0 5.31 -2.07 0 4.77 1 0 1.4 0 0 5.5
  [4,16,-1.26,0,5.31,-2.07,0,4.77,1,0,1.4,0,0,5.5],
// 4 16 1.16 0 5.31 0 0 5.5 1 0 1.4 2.27 0 4.77
  [4,16,1.16,0,5.31,0,0,5.5,1,0,1.4,2.27,0,4.77],
// 4 16 2.81 0 3.96 2.27 0 4.77 1 0 1.4 2.71 0 2.54
  [4,16,2.81,0,3.96,2.27,0,4.77,1,0,1.4,2.71,0,2.54],
// 3 16 2.81 0 3.96 2.71 0 2.54 2.9 0 3.2
  [3,16,2.81,0,3.96,2.71,0,2.54,2.9,0,3.2],
// 3 16 2.71 0 2.54 1 0 1.4 2.17 0 1.93
  [3,16,2.71,0,2.54,1,0,1.4,2.17,0,1.93],
// 3 16 10 0 10 4.66 0 4.72 4.8 0 3.2
  [3,16,10,0,10,4.66,0,4.72,4.8,0,3.2],
// 3 16 10 0 10 3.68 0 6.18 4.66 0 4.72
  [3,16,10,0,10,3.68,0,6.18,4.66,0,4.72],
// 3 16 10 0 10 2.12 0 7.16 3.68 0 6.18
  [3,16,10,0,10,2.12,0,7.16,3.68,0,6.18],
// 4 16 0 0 7.5 2.12 0 7.16 10 0 10 -10 0 10
  [4,16,0,0,7.5,2.12,0,7.16,10,0,10,-10,0,10],
// 3 16 -10 0 10 -2.02 0 7.16 0 0 7.5
  [3,16,-10,0,10,-2.02,0,7.16,0,0,7.5],
// 3 16 -10 0 10 -3.48 0 6.18 -2.02 0 7.16
  [3,16,-10,0,10,-3.48,0,6.18,-2.02,0,7.16],
// 3 16 -10 0 10 -4.46 0 4.72 -3.48 0 6.18
  [3,16,-10,0,10,-4.46,0,4.72,-3.48,0,6.18],
// 4 16 -4.8 0 3 -4.46 0 4.72 -10 0 10 -10 0 -10
  [4,16,-4.8,0,3,-4.46,0,4.72,-10,0,10,-10,0,-10],
// 4 16 1.61 0 -0.85 -2.8 0 -3 -2.67 0 -3.96 -2.12 0 -4.79
  [4,16,1.61,0,-0.85,-2.8,0,-3,-2.67,0,-3.96,-2.12,0,-4.79],
// 4 16 1.61 0 -0.85 -2.12 0 -4.79 -1.29 0 -5.34 0 0 -5.5
  [4,16,1.61,0,-0.85,-2.12,0,-4.79,-1.29,0,-5.34,0,0,-5.5],
// 4 16 1.61 0 -0.85 0 0 -5.5 1.17 0 -5.34 2.31 0 -4.79
  [4,16,1.61,0,-0.85,0,0,-5.5,1.17,0,-5.34,2.31,0,-4.79],
// 4 16 1.61 0 -0.85 2.31 0 -4.79 2.86 0 -3.96 3 0 -3
  [4,16,1.61,0,-0.85,2.31,0,-4.79,2.86,0,-3.96,3,0,-3],
// 4 16 1.61 0 -0.85 3 0 -3 2.86 0 -2.12 2.41 0 -1.4
  [4,16,1.61,0,-0.85,3,0,-3,2.86,0,-2.12,2.41,0,-1.4],
// 4 16 1 0 -0.6 -1 0 -0.6 -2.8 0 -3 1.61 0 -0.85
  [4,16,1,0,-0.6,-1,0,-0.6,-2.8,0,-3,1.61,0,-0.85],
// 4 16 -1 0 1.4 1 0 1.4 -2.8 0 3 -4.8 0 3
  [4,16,-1,0,1.4,1,0,1.4,-2.8,0,3,-4.8,0,3],
// 4 16 -4.9 0 -3 -2.8 0 -3 -1 0 -0.6 -4.8 0 3
  [4,16,-4.9,0,-3,-2.8,0,-3,-1,0,-0.6,-4.8,0,3],
// 3 16 -4.8 0 3 -1 0 -0.6 -1 0 1.4
  [3,16,-4.8,0,3,-1,0,-0.6,-1,0,1.4],
// 3 16 3.58 0 0.92 3 0 0.6 3.95 0 -0.16
  [3,16,3.58,0,0.92,3,0,0.6,3.95,0,-0.16],
// 4 16 4.46 0 1.88 3.58 0 0.92 3.95 0 -0.16 4.74 0 -1.34
  [4,16,4.46,0,1.88,3.58,0,0.92,3.95,0,-0.16,4.74,0,-1.34],
// 3 16 5 0 -3 4.74 0 -4.74 10 0 -10
  [3,16,5,0,-3,4.74,0,-4.74,10,0,-10],
// 3 16 4.74 0 -4.74 3.75 0 -6.23 10 0 -10
  [3,16,4.74,0,-4.74,3.75,0,-6.23,10,0,-10],
// 3 16 3.75 0 -6.23 2.12 0 -7.16 10 0 -10
  [3,16,3.75,0,-6.23,2.12,0,-7.16,10,0,-10],
// 4 16 10 0 -10 2.12 0 -7.16 0 0 -7.5 -10 0 -10
  [4,16,10,0,-10,2.12,0,-7.16,0,0,-7.5,-10,0,-10],
// 3 16 -2.02 0 -7.16 -10 0 -10 0 0 -7.5
  [3,16,-2.02,0,-7.16,-10,0,-10,0,0,-7.5],
// 3 16 -3.56 0 -6.23 -10 0 -10 -2.02 0 -7.16
  [3,16,-3.56,0,-6.23,-10,0,-10,-2.02,0,-7.16],
// 3 16 -4.55 0 -4.74 -10 0 -10 -3.56 0 -6.23
  [3,16,-4.55,0,-4.74,-10,0,-10,-3.56,0,-6.23],
// 3 16 -4.9 0 -3 -10 0 -10 -4.55 0 -4.74
  [3,16,-4.9,0,-3,-10,0,-10,-4.55,0,-4.74],
// 3 16 -4.8 0 3 -10 0 -10 -4.9 0 -3
  [3,16,-4.8,0,3,-10,0,-10,-4.9,0,-3],
// 4 16 4.74 0 -1.34 5 0 -3 10 0 -10 10 0 10
  [4,16,4.74,0,-1.34,5,0,-3,10,0,-10,10,0,10],
// 4 16 10 0 10 4.8 0 3.2 4.46 0 1.88 4.74 0 -1.34
  [4,16,10,0,10,4.8,0,3.2,4.46,0,1.88,4.74,0,-1.34],
];
module ldraw_lib__3070bpv3(step=0, col=false, unit=2/5, alt=false, line=0.2, solid=!$preview)
    makepoly(ldraw_lib__3070bpv3(solid), step=step, col=col, unit=unit, alt=alt, line=line, solid=solid);
ldraw_lib__3070bpv3(line=0.2);
